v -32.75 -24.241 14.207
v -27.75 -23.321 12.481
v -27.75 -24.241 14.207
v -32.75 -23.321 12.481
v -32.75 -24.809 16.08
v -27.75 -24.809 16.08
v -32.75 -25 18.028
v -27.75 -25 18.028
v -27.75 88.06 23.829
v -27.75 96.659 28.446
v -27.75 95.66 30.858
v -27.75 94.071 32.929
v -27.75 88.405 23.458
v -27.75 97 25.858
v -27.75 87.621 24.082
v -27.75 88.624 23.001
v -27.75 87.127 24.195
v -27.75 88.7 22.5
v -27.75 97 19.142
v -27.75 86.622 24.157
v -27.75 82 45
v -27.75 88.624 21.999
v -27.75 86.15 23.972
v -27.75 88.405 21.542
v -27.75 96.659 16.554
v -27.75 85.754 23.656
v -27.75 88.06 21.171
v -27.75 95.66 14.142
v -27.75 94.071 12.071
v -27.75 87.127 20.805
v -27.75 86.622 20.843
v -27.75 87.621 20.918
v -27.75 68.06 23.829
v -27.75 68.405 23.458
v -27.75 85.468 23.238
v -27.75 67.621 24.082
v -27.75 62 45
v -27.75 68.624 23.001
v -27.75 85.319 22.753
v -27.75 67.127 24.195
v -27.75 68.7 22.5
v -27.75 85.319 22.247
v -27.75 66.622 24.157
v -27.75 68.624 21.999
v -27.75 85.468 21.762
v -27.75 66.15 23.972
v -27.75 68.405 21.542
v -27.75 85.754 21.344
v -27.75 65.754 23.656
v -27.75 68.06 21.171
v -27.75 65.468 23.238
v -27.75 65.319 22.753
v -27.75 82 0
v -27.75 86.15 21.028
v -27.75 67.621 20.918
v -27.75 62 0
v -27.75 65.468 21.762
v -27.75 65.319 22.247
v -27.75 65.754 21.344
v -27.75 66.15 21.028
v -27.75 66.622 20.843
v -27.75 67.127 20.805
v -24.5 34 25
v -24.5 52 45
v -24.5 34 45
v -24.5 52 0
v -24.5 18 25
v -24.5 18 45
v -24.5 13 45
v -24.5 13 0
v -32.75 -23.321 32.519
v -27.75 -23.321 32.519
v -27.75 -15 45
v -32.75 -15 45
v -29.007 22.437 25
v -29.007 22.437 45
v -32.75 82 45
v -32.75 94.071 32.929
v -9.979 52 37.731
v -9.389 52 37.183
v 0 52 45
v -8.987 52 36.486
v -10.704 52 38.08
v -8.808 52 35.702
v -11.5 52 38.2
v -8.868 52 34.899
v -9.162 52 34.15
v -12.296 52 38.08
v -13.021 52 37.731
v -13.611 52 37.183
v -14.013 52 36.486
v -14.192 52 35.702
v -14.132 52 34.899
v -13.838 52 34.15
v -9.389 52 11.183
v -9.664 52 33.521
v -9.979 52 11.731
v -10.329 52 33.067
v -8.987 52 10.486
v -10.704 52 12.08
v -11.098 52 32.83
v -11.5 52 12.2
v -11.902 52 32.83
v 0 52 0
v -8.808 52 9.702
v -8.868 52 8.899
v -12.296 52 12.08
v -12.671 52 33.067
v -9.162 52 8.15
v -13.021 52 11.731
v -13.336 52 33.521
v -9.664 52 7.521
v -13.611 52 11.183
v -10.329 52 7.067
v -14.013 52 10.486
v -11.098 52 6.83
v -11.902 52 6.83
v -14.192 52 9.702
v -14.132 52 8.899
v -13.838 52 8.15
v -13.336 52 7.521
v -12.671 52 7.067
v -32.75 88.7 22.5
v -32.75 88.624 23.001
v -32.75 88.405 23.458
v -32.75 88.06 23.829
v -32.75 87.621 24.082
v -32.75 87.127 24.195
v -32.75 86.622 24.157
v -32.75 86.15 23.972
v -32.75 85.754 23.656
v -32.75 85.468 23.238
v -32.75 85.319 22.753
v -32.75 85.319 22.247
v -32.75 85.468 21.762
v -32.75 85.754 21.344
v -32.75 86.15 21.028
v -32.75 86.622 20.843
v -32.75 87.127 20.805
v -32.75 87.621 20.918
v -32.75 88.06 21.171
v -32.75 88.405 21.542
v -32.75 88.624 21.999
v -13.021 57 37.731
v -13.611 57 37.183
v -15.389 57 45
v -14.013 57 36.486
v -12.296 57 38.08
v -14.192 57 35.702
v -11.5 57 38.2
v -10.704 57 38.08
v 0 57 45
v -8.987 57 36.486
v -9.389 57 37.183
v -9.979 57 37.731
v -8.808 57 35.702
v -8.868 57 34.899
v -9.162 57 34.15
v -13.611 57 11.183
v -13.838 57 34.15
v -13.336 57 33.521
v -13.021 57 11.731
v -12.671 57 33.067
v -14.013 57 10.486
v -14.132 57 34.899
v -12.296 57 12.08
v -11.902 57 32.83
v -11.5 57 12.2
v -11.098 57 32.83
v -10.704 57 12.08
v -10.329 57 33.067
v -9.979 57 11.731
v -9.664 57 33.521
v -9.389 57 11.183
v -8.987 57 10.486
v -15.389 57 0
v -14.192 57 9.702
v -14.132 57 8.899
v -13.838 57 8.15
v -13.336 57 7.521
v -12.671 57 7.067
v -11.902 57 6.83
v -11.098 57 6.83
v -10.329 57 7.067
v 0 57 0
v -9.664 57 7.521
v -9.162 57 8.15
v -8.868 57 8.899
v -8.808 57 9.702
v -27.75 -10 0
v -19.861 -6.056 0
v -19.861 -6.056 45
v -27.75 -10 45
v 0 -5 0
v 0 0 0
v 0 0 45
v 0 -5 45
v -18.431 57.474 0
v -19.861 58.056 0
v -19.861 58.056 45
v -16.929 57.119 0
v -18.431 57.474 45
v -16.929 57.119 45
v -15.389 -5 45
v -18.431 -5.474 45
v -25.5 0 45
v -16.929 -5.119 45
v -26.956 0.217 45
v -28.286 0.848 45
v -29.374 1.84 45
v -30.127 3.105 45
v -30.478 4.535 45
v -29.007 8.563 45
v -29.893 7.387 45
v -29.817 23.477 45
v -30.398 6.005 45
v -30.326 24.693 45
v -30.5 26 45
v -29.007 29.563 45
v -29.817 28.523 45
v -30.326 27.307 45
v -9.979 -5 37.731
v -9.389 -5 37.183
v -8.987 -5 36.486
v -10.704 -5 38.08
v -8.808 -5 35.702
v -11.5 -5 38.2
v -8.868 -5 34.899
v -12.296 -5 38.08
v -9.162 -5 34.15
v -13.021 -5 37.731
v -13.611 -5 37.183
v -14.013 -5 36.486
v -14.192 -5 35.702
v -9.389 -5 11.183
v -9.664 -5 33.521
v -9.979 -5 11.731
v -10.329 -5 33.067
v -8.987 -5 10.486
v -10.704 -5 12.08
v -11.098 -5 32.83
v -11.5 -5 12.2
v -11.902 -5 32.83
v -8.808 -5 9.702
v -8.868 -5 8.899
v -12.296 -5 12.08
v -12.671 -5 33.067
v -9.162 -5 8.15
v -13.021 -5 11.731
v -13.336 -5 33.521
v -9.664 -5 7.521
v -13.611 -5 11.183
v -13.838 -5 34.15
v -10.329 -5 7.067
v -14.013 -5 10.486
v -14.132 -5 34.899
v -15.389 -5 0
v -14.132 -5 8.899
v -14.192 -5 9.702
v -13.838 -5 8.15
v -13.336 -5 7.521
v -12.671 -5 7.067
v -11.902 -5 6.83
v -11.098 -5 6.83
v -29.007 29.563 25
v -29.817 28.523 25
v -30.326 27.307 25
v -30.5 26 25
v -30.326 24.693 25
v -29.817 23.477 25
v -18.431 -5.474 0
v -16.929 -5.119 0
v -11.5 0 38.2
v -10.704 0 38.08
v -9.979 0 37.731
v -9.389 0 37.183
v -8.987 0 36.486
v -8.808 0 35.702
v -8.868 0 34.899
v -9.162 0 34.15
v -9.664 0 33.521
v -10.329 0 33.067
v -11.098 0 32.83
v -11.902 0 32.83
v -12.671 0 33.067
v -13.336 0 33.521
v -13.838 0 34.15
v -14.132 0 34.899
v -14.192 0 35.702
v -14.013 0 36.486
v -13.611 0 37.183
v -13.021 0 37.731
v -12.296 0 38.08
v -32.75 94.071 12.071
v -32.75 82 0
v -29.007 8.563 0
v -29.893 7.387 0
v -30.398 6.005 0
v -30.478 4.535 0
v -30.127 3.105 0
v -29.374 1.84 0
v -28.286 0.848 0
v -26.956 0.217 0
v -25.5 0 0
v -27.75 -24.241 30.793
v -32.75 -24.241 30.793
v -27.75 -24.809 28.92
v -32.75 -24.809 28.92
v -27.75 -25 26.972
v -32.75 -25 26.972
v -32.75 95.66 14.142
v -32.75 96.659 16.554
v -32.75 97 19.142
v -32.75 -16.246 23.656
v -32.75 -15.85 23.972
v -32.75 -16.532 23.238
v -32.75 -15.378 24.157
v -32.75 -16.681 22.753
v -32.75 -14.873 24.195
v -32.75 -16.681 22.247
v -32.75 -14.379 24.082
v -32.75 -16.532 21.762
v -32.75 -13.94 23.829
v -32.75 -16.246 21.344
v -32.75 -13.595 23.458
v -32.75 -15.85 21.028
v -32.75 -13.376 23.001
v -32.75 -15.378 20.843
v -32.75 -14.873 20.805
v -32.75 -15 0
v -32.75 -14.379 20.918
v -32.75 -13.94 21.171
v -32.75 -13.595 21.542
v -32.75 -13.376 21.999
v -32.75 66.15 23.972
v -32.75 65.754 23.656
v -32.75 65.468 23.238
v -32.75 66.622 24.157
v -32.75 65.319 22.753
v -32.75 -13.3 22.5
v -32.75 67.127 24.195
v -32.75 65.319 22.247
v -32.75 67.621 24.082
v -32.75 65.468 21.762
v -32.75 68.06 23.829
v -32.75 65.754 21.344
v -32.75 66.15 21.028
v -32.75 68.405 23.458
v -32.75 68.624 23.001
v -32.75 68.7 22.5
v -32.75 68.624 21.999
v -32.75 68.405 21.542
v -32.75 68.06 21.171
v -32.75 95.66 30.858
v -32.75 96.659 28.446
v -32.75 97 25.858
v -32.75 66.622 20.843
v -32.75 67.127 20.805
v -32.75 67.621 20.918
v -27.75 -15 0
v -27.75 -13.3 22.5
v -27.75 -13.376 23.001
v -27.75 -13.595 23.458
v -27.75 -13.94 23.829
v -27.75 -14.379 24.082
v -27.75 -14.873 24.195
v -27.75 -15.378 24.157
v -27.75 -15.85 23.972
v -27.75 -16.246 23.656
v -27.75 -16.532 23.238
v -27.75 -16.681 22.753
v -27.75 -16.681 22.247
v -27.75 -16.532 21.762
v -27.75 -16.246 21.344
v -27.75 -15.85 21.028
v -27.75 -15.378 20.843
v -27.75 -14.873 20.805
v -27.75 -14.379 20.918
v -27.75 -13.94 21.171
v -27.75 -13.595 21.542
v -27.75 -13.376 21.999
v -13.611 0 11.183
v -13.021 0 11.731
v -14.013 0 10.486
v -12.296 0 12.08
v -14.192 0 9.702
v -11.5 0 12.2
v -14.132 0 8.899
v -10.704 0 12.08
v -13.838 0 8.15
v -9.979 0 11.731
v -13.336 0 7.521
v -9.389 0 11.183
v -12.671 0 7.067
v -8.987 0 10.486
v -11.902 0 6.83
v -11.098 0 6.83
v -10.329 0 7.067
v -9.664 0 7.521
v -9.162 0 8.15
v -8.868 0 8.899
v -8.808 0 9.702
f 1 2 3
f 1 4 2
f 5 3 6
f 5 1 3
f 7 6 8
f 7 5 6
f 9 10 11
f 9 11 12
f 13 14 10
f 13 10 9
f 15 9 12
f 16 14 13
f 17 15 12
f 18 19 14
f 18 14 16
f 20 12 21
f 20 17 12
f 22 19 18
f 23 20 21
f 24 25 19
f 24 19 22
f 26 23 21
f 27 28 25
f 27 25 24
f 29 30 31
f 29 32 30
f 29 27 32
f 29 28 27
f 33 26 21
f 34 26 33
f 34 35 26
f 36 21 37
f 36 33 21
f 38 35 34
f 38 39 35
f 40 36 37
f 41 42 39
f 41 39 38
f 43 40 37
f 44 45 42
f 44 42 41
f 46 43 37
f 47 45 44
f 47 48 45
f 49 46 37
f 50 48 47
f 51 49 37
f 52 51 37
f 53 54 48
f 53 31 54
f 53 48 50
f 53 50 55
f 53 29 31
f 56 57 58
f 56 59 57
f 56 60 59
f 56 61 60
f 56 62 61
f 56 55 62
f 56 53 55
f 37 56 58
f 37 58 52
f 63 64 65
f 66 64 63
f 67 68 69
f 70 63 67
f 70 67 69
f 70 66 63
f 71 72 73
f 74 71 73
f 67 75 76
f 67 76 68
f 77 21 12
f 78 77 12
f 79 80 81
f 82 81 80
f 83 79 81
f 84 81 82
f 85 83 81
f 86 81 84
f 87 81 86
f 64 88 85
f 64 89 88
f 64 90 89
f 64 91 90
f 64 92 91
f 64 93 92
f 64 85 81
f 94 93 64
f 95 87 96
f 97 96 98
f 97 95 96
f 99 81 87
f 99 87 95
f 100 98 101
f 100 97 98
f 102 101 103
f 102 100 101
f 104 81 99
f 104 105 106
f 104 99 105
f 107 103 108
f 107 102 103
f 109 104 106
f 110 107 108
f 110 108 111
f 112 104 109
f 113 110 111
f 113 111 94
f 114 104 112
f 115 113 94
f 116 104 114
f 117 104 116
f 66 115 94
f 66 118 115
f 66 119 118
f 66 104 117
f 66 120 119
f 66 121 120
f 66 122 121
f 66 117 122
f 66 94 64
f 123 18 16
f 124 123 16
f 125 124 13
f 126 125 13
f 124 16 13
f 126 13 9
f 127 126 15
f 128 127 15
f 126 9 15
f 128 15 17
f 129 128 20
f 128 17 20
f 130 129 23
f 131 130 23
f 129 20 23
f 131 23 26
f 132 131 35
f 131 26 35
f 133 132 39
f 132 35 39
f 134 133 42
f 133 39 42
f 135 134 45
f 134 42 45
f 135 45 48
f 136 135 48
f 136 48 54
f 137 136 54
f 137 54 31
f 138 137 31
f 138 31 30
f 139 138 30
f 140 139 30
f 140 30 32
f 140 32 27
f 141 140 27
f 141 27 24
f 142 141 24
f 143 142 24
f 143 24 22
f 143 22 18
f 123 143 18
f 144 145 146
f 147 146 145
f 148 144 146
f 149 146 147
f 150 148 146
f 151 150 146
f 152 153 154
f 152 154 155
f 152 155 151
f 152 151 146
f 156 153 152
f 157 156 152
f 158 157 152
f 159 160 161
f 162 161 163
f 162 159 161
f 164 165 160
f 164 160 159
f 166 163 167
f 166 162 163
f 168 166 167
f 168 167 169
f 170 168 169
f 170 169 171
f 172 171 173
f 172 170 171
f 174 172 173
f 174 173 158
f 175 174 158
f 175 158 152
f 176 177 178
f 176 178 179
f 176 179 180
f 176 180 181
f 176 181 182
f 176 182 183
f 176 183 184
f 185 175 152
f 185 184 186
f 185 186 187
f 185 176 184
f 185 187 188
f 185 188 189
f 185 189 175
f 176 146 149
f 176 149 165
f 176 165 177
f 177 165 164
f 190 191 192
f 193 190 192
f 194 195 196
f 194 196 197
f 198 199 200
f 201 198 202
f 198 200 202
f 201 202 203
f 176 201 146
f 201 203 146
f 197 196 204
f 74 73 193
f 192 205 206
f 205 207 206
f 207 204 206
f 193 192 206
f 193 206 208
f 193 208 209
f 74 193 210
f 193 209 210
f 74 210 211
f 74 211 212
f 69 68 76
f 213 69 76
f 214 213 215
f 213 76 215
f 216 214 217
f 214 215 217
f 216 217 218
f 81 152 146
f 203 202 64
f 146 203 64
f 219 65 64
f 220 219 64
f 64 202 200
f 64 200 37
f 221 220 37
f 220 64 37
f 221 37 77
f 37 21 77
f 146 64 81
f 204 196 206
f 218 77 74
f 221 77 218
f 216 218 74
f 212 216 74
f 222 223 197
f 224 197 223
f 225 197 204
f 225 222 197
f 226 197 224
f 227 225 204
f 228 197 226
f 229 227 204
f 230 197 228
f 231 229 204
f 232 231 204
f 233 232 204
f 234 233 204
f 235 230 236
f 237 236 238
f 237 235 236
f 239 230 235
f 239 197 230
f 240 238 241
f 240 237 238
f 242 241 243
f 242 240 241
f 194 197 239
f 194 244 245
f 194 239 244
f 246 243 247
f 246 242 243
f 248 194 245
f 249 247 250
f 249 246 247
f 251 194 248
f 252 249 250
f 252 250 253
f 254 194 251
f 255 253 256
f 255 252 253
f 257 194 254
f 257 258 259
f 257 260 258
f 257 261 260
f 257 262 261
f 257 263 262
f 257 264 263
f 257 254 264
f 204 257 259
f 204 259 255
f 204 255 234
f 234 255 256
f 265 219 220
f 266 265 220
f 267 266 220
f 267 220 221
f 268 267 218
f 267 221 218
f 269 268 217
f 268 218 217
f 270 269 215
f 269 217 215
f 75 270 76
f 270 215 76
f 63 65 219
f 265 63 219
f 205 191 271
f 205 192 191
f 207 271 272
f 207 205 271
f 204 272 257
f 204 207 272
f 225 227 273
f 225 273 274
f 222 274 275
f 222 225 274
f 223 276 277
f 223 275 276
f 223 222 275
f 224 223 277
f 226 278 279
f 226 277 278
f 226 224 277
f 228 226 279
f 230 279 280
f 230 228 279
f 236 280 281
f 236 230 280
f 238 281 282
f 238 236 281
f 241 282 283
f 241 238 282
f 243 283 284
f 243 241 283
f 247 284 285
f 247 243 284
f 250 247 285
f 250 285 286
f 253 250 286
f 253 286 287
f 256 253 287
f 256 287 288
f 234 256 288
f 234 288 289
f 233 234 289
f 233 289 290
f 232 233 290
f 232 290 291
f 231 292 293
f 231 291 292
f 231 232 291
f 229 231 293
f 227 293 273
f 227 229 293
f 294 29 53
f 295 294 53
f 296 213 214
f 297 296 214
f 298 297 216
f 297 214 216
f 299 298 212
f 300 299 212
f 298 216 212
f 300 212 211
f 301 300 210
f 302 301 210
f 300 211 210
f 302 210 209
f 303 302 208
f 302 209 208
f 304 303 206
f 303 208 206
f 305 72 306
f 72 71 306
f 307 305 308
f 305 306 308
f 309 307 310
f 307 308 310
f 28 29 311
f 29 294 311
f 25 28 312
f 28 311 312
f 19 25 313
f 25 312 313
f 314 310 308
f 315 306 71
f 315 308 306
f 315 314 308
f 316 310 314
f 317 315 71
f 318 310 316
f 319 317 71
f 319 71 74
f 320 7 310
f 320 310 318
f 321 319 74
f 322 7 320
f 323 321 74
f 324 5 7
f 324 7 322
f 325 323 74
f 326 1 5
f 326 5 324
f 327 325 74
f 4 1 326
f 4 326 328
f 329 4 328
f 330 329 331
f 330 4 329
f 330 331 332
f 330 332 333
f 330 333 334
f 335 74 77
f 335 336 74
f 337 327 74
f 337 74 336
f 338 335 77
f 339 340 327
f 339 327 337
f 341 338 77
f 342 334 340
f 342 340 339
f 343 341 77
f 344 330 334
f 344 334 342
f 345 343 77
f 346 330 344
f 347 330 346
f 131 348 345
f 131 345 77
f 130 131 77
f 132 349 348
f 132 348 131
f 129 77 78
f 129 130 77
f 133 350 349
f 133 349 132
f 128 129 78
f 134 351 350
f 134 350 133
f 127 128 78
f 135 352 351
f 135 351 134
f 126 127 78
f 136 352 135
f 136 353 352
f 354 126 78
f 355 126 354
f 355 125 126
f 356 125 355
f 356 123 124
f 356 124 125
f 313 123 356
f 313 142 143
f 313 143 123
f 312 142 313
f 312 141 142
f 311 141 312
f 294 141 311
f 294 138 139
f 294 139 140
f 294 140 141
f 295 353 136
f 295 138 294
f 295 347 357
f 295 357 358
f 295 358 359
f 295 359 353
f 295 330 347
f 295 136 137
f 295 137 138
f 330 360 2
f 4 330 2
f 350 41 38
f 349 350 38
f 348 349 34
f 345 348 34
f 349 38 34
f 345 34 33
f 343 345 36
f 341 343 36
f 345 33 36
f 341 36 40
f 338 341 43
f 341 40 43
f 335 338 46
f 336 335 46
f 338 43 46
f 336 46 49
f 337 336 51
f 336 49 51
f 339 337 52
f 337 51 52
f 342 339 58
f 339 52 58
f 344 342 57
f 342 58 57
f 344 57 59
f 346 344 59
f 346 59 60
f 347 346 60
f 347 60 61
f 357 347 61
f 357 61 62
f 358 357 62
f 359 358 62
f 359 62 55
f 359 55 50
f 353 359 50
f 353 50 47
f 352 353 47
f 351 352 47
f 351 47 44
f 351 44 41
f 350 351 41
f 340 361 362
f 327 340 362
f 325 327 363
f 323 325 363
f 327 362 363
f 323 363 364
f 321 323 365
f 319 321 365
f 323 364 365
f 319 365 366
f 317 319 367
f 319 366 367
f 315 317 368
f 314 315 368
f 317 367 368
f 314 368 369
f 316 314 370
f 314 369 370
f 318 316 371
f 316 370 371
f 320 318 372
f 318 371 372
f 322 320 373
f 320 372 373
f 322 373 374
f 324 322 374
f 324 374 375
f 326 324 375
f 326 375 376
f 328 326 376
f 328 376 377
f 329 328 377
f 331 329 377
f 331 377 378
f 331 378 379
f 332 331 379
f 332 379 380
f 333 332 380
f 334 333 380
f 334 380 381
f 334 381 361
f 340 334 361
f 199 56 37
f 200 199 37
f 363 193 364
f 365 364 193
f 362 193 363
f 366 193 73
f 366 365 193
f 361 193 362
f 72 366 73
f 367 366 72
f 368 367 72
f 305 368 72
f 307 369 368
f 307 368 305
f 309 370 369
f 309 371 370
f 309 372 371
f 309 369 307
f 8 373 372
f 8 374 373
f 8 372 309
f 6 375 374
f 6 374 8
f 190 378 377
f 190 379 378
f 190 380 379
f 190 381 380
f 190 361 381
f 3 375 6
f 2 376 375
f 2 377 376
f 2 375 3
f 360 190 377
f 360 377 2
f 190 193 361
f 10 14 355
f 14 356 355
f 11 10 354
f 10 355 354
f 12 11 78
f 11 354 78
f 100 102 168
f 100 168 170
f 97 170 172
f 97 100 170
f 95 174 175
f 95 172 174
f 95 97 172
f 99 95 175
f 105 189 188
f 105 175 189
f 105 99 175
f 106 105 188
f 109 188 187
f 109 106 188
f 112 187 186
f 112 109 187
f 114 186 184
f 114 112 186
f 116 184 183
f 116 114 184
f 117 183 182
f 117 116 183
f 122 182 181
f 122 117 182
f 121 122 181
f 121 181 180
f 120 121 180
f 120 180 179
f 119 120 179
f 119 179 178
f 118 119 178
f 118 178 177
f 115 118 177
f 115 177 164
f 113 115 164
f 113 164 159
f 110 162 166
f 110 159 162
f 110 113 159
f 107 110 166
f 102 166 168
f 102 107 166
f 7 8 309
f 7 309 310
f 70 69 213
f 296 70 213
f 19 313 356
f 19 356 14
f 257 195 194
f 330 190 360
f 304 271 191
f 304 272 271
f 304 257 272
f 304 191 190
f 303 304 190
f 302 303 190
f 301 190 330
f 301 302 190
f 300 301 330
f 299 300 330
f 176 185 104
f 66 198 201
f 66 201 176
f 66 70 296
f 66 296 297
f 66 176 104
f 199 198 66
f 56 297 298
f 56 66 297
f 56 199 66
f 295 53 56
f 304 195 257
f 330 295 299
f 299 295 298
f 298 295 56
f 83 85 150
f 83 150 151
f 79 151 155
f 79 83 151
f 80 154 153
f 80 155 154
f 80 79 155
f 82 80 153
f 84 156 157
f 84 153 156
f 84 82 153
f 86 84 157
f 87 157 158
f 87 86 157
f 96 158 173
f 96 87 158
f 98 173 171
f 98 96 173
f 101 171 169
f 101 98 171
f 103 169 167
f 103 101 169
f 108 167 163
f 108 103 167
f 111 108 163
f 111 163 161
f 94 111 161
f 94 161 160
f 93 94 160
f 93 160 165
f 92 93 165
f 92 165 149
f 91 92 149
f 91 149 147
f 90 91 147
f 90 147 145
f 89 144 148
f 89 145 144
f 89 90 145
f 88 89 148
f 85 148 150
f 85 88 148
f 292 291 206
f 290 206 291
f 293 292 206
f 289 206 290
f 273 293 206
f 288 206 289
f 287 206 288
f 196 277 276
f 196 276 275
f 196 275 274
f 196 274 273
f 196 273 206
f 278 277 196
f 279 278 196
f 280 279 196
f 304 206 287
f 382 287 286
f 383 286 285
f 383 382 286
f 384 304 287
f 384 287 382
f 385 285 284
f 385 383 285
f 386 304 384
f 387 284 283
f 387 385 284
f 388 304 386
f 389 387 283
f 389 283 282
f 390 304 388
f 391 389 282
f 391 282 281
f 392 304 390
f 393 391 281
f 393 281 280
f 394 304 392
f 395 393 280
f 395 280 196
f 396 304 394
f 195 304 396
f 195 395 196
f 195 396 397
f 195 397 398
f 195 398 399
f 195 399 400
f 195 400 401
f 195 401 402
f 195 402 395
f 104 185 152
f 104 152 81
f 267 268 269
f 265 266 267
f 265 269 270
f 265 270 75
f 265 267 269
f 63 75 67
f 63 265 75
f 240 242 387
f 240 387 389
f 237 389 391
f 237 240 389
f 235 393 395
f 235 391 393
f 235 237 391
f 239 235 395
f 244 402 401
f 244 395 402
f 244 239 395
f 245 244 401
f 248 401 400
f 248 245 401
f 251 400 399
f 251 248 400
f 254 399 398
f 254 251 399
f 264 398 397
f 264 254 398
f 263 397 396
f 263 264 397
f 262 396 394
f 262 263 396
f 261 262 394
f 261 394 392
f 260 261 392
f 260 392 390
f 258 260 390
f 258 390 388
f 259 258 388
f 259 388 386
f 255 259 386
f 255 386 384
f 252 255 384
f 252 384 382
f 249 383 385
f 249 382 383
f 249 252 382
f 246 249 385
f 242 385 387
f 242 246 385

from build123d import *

# Parameters (mm, degrees)
BOSS_EXTRUDE1_DEPTH     = 45
SKETCH3_R               = 1.7
CUT_EXTRUDE1_DEPTH      = 111.471998715
CHAMFER1_SIZE           = 5
CHAMFER1_SIZE2          = 10
CHAMFER2_SIZE           = 10
CHAMFER2_SIZE2          = 5
FILLET1_R               = 10
CUT_EXTRUDE2_DEPTH      = 112.832743416
CUT_EXTRUDE2_DEPTH_BACK = 112.832743416
SKETCH5_R               = 2.7
CUT_EXTRUDE3_DEPTH      = 112.832743416
CUT_EXTRUDE4_DEPTH      = 20


with BuildPart() as part:
    # Sketch1 → Boss-Extrude1 (new body)
    with BuildSketch(Plane.XY):
        Polygon((0, 0), (0, -5), (-27.75, -5), (-27.75, -25), (-32.75, -25), (-32.75, 97), (-27.75, 97), (-27.75, 57), (0, 57), (0, 52), (-24.5, 52), (-24.5, 0), align=None)
    extrude(amount=BOSS_EXTRUDE1_DEPTH)

    # Sketch3 → Cut-Extrude1 (cut, through all)
    with BuildSketch(Plane(origin=(-27.75, 0, 0), x_dir=(0, 0, -1), z_dir=(1, 0, 0))):
        Polygon((-45, 97), (-45, 82), (-30, 97), align=None)
        Polygon((-15, 97), (0, 82), (0, 97), align=None)
        Polygon((-30, -25), (-45, -15), (-45, -25), align=None)
        Polygon((0, -25), (0, -15), (-15, -25), align=None)
        with Locations(Location((-22.5, -15, 0), (0, 0, 90))):
            Circle(SKETCH3_R)
        with Locations(Location((-22.5, 87, 0), (0, 0, 90))):
            Circle(SKETCH3_R)
        with Locations(Location((-22.5, 67, 0), (0, 0, 90))):
            Circle(SKETCH3_R)
    extrude(amount=-CUT_EXTRUDE1_DEPTH, mode=Mode.SUBTRACT)

    # Chamfer1
    chamfer1_edges = [part.edges().sort_by_distance(p)[0] for p in [
        (-27.75, -5, 22.5),
    ]]
    chamfer1_side = [part.faces().sort_by_distance(p)[0] for p in [
        (-27.75, -10, 0.49244289),
    ]]
    chamfer(chamfer1_edges, length=CHAMFER1_SIZE, length2=CHAMFER1_SIZE2, reference=chamfer1_side[0])

    # Chamfer2
    chamfer2_edges = [part.edges().sort_by_distance(p)[0] for p in [
        (-27.75, 57, 22.5),
    ]]
    chamfer2_side = [part.faces().sort_by_distance(p)[0] for p in [
        (-13.875, 57, 22.5),
    ]]
    chamfer(chamfer2_edges, length=CHAMFER2_SIZE, length2=CHAMFER2_SIZE2, reference=chamfer2_side[0])

    # Fillet1
    fillet1_edges = [part.edges().sort_by_distance(p)[0] for p in [
        (-17.75, 57, 22.5),
        (-30.25, -25, 15),
        (-30.25, -25, 30),
        (-30.25, 97, 15),
        (-30.25, 97, 30),
        (-17.75, -5, 22.5),
    ]]
    fillet(fillet1_edges, radius=FILLET1_R)

    # Sketch5 → Cut-Extrude2 (cut, two sides: drawn at the far end of the back side and taken through both)
    with BuildSketch(Plane(origin=(0, 0, 0), x_dir=(1, 0, 0), z_dir=(0, 1, 0)).offset(-CUT_EXTRUDE2_DEPTH_BACK)):
        with Locations(Location((-11.5, -9.5, 0), (0, 0, 270))):
            Circle(SKETCH5_R)
        with Locations(Location((-11.5, -35.5, 0), (0, 0, 270))):
            Circle(SKETCH5_R)
    extrude(amount=CUT_EXTRUDE2_DEPTH + CUT_EXTRUDE2_DEPTH_BACK, mode=Mode.SUBTRACT)

    # Sketch6 → Cut-Extrude3 (cut, through all)
    with BuildSketch(Plane.XY.offset(45)):
        with BuildLine():
            Line((-24.5, 13), (-29.007418659, 8.563427332))
            ThreePointArc((-29.007418659, 8.563427332), (-30.126939413, 3.104892702), (-25.5, 0))
            Line((-25.5, 0), (-24.5, 0))
            Line((-24.5, 0), (-24.5, 13))
        make_face()
    extrude(amount=-CUT_EXTRUDE3_DEPTH, mode=Mode.SUBTRACT)

    # Sketch7 → Cut-Extrude4 (cut)
    with BuildSketch(Plane.XY.offset(45)):
        with BuildLine():
            Line((-24.5, 18), (-24.5, 34))
            Line((-24.5, 34), (-29.007418659, 29.563427332))
            ThreePointArc((-29.007418659, 29.563427332), (-30.5, 26), (-29.007418659, 22.436572668))
            Line((-29.007418659, 22.436572668), (-24.5, 18))
        make_face()
    extrude(amount=-CUT_EXTRUDE4_DEPTH, mode=Mode.SUBTRACT)


solid = part.part
